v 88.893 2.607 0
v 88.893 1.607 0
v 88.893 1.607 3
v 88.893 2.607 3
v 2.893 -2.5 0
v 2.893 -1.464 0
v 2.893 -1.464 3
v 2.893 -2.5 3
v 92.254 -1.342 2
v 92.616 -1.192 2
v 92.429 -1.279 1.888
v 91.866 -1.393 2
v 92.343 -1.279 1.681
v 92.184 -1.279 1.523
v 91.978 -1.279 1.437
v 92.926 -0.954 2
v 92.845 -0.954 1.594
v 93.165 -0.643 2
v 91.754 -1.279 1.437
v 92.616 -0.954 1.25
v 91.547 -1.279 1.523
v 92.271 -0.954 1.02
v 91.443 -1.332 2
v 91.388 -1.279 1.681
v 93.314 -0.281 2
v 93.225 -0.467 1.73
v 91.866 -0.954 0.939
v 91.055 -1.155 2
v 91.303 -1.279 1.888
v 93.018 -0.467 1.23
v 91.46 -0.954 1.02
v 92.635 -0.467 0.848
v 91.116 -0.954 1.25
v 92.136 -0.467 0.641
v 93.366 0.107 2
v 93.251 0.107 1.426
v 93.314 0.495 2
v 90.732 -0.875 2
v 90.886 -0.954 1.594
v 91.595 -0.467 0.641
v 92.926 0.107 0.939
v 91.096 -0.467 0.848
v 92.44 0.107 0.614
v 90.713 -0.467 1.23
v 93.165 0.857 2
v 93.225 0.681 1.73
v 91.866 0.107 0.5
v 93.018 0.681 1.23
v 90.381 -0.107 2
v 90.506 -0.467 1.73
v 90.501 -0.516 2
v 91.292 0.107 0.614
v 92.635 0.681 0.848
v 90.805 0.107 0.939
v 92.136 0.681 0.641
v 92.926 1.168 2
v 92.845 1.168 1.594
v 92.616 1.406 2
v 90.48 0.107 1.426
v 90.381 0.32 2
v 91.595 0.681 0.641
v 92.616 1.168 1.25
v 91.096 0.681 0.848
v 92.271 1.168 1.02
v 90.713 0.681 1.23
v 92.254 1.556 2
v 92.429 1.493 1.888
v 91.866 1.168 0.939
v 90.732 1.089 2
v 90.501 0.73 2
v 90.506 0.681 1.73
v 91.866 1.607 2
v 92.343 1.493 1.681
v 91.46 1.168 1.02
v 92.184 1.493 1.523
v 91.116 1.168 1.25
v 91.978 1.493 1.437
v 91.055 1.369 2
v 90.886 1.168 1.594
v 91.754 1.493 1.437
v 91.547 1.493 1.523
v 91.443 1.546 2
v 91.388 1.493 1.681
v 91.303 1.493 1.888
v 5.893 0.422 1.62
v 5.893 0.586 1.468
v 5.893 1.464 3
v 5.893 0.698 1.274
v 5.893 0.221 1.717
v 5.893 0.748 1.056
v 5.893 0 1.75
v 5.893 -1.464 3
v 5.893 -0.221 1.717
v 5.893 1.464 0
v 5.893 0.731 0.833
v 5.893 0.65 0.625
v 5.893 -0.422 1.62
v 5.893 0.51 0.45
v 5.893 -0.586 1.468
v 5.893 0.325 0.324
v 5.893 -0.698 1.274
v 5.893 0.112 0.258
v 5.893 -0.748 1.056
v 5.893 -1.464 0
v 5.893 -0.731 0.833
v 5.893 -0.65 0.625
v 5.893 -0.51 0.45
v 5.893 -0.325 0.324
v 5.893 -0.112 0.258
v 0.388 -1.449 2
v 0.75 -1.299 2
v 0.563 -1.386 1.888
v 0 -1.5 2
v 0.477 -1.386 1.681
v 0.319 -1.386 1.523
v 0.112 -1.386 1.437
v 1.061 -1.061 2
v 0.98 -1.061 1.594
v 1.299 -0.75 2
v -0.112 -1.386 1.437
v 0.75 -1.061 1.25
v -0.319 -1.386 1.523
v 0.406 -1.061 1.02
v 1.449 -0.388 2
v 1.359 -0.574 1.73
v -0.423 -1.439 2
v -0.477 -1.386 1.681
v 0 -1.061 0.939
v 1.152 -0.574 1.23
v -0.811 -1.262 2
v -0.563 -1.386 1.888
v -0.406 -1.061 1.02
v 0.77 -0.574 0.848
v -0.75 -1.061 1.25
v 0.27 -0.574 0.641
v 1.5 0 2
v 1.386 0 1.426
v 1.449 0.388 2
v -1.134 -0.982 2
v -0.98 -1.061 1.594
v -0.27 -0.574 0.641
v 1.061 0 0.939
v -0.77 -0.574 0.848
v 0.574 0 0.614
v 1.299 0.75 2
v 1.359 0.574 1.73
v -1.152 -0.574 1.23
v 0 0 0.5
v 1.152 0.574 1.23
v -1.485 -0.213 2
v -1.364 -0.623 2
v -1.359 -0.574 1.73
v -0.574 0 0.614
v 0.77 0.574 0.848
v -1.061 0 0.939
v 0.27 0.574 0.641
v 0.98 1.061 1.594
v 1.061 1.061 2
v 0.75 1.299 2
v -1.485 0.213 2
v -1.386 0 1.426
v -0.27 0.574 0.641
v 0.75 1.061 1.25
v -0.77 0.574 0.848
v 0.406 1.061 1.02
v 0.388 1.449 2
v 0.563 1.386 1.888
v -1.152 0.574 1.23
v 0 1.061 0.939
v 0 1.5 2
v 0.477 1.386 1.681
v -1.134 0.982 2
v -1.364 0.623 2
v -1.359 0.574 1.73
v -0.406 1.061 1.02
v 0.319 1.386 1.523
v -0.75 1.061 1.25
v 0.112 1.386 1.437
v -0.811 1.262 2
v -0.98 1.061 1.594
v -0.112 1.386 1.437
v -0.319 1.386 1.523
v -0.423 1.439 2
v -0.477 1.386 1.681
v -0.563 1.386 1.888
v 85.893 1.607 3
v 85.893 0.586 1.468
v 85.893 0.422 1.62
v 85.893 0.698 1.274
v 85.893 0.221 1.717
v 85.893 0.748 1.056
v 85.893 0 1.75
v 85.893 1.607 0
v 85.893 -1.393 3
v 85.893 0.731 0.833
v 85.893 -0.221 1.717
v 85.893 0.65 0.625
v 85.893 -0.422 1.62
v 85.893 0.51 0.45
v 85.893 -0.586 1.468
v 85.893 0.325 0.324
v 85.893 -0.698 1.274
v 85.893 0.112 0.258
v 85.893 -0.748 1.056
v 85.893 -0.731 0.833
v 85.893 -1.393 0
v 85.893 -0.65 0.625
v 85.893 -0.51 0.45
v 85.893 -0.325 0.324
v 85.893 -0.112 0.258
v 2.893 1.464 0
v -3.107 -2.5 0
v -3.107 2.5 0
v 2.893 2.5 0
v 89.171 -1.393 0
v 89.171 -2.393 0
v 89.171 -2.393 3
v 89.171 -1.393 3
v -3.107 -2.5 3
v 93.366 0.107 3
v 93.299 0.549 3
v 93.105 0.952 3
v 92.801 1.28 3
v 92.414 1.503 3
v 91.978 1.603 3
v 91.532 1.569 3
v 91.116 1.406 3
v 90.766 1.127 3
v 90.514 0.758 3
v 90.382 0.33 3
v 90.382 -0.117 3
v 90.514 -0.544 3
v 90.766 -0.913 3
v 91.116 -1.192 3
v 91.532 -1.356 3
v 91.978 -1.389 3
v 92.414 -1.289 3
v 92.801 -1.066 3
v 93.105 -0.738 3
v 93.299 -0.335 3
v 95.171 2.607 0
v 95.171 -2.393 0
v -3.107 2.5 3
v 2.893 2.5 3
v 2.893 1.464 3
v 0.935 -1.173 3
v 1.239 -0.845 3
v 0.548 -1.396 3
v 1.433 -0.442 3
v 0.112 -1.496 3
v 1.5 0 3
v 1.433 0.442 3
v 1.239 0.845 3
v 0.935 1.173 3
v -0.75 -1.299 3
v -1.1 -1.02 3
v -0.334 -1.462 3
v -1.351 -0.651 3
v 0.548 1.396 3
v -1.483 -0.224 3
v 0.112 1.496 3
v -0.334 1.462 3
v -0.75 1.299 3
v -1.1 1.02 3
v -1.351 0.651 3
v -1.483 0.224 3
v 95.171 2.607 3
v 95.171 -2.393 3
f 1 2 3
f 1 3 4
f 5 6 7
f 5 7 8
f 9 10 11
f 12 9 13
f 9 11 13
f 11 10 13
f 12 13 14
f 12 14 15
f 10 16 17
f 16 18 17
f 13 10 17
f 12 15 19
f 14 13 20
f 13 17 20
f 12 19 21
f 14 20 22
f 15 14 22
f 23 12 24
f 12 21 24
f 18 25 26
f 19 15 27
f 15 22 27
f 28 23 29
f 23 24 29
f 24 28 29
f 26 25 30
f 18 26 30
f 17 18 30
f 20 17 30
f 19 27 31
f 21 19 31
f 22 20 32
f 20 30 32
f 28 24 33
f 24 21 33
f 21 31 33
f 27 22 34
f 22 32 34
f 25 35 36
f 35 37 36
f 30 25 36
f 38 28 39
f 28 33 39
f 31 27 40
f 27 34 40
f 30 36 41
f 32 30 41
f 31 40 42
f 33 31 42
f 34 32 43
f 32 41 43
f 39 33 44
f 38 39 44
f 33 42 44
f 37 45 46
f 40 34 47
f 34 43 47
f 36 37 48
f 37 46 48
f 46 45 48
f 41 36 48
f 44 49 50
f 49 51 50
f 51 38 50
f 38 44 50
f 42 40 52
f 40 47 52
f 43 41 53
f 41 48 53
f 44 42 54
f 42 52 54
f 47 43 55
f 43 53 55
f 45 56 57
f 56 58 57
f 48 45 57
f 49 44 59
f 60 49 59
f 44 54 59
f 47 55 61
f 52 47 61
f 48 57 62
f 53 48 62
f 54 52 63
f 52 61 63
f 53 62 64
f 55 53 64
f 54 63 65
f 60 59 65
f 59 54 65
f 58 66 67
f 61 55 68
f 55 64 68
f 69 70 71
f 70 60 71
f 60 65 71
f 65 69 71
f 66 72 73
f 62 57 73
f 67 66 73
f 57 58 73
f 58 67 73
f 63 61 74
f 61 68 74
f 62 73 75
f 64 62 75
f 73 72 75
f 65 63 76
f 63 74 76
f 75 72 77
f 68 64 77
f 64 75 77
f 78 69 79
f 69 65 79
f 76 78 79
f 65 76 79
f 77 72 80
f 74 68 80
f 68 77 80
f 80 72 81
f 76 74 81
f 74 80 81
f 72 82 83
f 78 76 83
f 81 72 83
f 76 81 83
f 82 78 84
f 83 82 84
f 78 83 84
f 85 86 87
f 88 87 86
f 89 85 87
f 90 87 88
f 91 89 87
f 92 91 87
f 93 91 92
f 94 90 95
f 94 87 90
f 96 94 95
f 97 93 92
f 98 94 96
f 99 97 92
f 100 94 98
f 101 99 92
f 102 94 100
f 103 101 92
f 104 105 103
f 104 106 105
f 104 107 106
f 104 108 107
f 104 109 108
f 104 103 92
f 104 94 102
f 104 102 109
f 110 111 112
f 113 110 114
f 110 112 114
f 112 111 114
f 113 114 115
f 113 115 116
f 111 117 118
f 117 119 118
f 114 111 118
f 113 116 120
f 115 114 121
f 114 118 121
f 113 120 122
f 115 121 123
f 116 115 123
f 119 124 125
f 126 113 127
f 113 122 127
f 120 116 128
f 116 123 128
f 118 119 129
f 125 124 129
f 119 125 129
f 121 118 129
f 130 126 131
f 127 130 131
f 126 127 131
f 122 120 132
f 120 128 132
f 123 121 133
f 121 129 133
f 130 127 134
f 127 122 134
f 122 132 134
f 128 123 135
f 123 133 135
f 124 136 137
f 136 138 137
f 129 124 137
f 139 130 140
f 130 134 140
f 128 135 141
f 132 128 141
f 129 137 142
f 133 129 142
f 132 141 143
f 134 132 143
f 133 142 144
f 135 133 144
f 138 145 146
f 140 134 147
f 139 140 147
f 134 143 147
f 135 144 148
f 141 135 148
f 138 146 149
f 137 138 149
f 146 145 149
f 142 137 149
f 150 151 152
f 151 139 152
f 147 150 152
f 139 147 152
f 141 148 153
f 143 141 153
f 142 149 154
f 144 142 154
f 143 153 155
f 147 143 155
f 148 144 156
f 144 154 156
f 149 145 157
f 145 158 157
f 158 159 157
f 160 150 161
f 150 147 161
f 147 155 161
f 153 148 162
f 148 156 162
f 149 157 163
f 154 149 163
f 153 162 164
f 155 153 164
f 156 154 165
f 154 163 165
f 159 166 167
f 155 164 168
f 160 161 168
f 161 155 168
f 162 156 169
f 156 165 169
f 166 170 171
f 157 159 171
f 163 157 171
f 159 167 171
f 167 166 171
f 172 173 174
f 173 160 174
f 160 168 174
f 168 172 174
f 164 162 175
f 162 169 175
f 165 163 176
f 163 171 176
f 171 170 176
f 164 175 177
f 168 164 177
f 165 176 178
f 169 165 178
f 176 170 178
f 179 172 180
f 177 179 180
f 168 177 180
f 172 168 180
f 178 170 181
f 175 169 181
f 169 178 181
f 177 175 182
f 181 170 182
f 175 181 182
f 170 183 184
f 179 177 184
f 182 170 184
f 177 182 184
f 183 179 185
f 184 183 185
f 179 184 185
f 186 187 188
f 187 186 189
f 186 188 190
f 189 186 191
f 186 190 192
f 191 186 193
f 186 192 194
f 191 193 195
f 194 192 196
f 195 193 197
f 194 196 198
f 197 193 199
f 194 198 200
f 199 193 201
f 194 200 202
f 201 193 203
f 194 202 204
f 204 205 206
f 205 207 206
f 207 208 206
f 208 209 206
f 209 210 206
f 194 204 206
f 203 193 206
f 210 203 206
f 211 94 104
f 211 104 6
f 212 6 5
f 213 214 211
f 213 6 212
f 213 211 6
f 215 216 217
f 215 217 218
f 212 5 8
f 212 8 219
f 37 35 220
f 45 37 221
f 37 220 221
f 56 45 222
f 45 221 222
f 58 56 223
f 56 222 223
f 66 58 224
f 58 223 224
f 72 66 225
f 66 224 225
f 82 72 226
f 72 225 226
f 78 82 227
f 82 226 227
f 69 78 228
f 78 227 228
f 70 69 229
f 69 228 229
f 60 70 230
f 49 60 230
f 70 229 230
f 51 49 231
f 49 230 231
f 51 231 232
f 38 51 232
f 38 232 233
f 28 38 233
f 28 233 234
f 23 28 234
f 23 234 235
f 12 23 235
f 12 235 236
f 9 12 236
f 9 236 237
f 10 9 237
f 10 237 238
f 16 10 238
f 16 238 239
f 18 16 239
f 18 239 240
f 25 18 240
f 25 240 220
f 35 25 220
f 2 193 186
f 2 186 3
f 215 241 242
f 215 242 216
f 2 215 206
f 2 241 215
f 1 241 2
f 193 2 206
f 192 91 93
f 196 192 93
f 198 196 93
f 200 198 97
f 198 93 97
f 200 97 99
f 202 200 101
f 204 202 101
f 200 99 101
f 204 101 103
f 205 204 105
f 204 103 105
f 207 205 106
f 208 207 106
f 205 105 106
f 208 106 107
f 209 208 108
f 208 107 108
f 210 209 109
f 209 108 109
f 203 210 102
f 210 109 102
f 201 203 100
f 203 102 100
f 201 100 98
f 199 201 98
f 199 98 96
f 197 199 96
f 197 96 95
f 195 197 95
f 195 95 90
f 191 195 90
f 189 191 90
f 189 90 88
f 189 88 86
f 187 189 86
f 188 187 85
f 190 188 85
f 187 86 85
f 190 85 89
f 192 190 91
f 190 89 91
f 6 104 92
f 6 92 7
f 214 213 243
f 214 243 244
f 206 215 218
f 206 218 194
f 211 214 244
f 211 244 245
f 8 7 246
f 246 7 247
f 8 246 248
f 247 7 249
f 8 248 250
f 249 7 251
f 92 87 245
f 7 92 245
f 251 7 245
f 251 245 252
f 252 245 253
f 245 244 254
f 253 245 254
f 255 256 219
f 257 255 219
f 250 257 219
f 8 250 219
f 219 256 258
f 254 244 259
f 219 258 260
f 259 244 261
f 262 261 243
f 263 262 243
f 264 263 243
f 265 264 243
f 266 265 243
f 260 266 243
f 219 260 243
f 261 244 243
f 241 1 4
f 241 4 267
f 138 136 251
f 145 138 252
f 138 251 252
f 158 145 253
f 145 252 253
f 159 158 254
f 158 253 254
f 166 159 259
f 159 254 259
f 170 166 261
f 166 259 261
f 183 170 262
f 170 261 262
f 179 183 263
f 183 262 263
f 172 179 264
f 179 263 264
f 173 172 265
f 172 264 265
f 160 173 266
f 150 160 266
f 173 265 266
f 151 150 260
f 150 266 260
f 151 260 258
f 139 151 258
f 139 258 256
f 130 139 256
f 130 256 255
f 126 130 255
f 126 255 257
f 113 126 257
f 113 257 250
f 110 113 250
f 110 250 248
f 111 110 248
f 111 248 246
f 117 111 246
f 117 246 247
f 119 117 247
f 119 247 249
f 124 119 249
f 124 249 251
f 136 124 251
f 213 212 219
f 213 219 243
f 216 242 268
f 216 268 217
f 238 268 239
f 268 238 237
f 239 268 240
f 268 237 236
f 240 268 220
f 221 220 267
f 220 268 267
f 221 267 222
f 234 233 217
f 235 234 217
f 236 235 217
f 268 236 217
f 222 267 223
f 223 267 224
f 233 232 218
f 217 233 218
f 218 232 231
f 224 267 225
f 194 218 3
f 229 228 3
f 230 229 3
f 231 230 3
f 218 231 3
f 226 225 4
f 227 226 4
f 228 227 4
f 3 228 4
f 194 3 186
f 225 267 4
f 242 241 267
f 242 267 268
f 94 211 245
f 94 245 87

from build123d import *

# Parameters (mm, degrees)
BOSS_EXTRUDE1_DEPTH = 3
SKETCH2_R           = 1.5
CUT_EXTRUDE1_DEPTH  = 1
SKETCH3_R           = 0.75
BOSS_EXTRUDE2_DEPTH = 80
BOSS_EXTRUDE3_DEPTH = 3
SKETCH7_R           = 1.5
CUT_EXTRUDE2_DEPTH  = 1


with BuildPart() as part:
    # Sketch1 → Boss-Extrude1 (new body)
    with BuildSketch(Plane.XY):
        Polygon((-3.106795218, -2.5), (-3.106795218, 2.5), (2.893204782, 2.5), (2.893204782, 1.464436404), (5.893204782, 1.464436404), (5.893204782, -1.464436404), (2.893204782, -1.464436404), (2.893204782, -2.5), align=None)
    extrude(amount=BOSS_EXTRUDE1_DEPTH)

    # Sketch2 → Cut-Extrude1 (cut)
    with BuildSketch(Plane.XY.offset(3)):
        Circle(SKETCH2_R)
    extrude(amount=-CUT_EXTRUDE1_DEPTH, mode=Mode.SUBTRACT)

    # Sketch3 → Boss-Extrude2 (add)
    with BuildSketch(Plane(origin=(5.893204782, 0, 0), x_dir=(0, 0, -1), z_dir=(1, 0, 0))):
        with Locations(Location((-1, 0, 0), (0, 0, 180))):
            Circle(SKETCH3_R)
    extrude(amount=BOSS_EXTRUDE2_DEPTH)

    # Sketch4 → Boss-Extrude3 (add)
    with BuildSketch(Plane.XY):
        Polygon((85.893204782, 0.75), (85.893204782, 1.606881618), (88.893204782, 1.606881618), (88.893204782, 2.606881618), (95.170891527, 2.606881618), (95.170891527, -2.393118382), (89.170891527, -2.393118382), (89.170891527, -1.393118382), (85.893204782, -1.393118382), (85.893204782, -0.75), align=None)
    extrude(amount=BOSS_EXTRUDE3_DEPTH)

    # Sketch7 → Cut-Extrude2 (cut)
    with BuildSketch(Plane.XY.offset(3)):
        with Locations((91.865552177, 0.106881618)):
            Circle(SKETCH7_R)
    extrude(amount=-CUT_EXTRUDE2_DEPTH, mode=Mode.SUBTRACT)

    # Sketch8 → Cut-Revolve1 (revolve, cut)
    with BuildSketch(Plane.XY.offset(2)):
        with BuildLine():
            Line((91.865552177, 1.606881618), (91.865552177, -1.393118382))
            ThreePointArc((91.865552177, -1.393118382), (93.365552177, 0.106881618), (91.865552177, 1.606881618))
        make_face()
    revolve(axis=Axis((91.865552177, -999.893118382, 2), (0, 1, 0)), mode=Mode.SUBTRACT)

    # Sketch9 → Cut-Revolve2 (revolve, cut)
    with BuildSketch(Plane.XY.offset(2)):
        with BuildLine():
            Line((0, 1.5), (0, -1.5))
            ThreePointArc((0, -1.5), (1.5, 0), (0, 1.5))
        make_face()
    revolve(axis=Axis((0, -1000, 2), (0, 1, 0)), mode=Mode.SUBTRACT)


solid = part.part
